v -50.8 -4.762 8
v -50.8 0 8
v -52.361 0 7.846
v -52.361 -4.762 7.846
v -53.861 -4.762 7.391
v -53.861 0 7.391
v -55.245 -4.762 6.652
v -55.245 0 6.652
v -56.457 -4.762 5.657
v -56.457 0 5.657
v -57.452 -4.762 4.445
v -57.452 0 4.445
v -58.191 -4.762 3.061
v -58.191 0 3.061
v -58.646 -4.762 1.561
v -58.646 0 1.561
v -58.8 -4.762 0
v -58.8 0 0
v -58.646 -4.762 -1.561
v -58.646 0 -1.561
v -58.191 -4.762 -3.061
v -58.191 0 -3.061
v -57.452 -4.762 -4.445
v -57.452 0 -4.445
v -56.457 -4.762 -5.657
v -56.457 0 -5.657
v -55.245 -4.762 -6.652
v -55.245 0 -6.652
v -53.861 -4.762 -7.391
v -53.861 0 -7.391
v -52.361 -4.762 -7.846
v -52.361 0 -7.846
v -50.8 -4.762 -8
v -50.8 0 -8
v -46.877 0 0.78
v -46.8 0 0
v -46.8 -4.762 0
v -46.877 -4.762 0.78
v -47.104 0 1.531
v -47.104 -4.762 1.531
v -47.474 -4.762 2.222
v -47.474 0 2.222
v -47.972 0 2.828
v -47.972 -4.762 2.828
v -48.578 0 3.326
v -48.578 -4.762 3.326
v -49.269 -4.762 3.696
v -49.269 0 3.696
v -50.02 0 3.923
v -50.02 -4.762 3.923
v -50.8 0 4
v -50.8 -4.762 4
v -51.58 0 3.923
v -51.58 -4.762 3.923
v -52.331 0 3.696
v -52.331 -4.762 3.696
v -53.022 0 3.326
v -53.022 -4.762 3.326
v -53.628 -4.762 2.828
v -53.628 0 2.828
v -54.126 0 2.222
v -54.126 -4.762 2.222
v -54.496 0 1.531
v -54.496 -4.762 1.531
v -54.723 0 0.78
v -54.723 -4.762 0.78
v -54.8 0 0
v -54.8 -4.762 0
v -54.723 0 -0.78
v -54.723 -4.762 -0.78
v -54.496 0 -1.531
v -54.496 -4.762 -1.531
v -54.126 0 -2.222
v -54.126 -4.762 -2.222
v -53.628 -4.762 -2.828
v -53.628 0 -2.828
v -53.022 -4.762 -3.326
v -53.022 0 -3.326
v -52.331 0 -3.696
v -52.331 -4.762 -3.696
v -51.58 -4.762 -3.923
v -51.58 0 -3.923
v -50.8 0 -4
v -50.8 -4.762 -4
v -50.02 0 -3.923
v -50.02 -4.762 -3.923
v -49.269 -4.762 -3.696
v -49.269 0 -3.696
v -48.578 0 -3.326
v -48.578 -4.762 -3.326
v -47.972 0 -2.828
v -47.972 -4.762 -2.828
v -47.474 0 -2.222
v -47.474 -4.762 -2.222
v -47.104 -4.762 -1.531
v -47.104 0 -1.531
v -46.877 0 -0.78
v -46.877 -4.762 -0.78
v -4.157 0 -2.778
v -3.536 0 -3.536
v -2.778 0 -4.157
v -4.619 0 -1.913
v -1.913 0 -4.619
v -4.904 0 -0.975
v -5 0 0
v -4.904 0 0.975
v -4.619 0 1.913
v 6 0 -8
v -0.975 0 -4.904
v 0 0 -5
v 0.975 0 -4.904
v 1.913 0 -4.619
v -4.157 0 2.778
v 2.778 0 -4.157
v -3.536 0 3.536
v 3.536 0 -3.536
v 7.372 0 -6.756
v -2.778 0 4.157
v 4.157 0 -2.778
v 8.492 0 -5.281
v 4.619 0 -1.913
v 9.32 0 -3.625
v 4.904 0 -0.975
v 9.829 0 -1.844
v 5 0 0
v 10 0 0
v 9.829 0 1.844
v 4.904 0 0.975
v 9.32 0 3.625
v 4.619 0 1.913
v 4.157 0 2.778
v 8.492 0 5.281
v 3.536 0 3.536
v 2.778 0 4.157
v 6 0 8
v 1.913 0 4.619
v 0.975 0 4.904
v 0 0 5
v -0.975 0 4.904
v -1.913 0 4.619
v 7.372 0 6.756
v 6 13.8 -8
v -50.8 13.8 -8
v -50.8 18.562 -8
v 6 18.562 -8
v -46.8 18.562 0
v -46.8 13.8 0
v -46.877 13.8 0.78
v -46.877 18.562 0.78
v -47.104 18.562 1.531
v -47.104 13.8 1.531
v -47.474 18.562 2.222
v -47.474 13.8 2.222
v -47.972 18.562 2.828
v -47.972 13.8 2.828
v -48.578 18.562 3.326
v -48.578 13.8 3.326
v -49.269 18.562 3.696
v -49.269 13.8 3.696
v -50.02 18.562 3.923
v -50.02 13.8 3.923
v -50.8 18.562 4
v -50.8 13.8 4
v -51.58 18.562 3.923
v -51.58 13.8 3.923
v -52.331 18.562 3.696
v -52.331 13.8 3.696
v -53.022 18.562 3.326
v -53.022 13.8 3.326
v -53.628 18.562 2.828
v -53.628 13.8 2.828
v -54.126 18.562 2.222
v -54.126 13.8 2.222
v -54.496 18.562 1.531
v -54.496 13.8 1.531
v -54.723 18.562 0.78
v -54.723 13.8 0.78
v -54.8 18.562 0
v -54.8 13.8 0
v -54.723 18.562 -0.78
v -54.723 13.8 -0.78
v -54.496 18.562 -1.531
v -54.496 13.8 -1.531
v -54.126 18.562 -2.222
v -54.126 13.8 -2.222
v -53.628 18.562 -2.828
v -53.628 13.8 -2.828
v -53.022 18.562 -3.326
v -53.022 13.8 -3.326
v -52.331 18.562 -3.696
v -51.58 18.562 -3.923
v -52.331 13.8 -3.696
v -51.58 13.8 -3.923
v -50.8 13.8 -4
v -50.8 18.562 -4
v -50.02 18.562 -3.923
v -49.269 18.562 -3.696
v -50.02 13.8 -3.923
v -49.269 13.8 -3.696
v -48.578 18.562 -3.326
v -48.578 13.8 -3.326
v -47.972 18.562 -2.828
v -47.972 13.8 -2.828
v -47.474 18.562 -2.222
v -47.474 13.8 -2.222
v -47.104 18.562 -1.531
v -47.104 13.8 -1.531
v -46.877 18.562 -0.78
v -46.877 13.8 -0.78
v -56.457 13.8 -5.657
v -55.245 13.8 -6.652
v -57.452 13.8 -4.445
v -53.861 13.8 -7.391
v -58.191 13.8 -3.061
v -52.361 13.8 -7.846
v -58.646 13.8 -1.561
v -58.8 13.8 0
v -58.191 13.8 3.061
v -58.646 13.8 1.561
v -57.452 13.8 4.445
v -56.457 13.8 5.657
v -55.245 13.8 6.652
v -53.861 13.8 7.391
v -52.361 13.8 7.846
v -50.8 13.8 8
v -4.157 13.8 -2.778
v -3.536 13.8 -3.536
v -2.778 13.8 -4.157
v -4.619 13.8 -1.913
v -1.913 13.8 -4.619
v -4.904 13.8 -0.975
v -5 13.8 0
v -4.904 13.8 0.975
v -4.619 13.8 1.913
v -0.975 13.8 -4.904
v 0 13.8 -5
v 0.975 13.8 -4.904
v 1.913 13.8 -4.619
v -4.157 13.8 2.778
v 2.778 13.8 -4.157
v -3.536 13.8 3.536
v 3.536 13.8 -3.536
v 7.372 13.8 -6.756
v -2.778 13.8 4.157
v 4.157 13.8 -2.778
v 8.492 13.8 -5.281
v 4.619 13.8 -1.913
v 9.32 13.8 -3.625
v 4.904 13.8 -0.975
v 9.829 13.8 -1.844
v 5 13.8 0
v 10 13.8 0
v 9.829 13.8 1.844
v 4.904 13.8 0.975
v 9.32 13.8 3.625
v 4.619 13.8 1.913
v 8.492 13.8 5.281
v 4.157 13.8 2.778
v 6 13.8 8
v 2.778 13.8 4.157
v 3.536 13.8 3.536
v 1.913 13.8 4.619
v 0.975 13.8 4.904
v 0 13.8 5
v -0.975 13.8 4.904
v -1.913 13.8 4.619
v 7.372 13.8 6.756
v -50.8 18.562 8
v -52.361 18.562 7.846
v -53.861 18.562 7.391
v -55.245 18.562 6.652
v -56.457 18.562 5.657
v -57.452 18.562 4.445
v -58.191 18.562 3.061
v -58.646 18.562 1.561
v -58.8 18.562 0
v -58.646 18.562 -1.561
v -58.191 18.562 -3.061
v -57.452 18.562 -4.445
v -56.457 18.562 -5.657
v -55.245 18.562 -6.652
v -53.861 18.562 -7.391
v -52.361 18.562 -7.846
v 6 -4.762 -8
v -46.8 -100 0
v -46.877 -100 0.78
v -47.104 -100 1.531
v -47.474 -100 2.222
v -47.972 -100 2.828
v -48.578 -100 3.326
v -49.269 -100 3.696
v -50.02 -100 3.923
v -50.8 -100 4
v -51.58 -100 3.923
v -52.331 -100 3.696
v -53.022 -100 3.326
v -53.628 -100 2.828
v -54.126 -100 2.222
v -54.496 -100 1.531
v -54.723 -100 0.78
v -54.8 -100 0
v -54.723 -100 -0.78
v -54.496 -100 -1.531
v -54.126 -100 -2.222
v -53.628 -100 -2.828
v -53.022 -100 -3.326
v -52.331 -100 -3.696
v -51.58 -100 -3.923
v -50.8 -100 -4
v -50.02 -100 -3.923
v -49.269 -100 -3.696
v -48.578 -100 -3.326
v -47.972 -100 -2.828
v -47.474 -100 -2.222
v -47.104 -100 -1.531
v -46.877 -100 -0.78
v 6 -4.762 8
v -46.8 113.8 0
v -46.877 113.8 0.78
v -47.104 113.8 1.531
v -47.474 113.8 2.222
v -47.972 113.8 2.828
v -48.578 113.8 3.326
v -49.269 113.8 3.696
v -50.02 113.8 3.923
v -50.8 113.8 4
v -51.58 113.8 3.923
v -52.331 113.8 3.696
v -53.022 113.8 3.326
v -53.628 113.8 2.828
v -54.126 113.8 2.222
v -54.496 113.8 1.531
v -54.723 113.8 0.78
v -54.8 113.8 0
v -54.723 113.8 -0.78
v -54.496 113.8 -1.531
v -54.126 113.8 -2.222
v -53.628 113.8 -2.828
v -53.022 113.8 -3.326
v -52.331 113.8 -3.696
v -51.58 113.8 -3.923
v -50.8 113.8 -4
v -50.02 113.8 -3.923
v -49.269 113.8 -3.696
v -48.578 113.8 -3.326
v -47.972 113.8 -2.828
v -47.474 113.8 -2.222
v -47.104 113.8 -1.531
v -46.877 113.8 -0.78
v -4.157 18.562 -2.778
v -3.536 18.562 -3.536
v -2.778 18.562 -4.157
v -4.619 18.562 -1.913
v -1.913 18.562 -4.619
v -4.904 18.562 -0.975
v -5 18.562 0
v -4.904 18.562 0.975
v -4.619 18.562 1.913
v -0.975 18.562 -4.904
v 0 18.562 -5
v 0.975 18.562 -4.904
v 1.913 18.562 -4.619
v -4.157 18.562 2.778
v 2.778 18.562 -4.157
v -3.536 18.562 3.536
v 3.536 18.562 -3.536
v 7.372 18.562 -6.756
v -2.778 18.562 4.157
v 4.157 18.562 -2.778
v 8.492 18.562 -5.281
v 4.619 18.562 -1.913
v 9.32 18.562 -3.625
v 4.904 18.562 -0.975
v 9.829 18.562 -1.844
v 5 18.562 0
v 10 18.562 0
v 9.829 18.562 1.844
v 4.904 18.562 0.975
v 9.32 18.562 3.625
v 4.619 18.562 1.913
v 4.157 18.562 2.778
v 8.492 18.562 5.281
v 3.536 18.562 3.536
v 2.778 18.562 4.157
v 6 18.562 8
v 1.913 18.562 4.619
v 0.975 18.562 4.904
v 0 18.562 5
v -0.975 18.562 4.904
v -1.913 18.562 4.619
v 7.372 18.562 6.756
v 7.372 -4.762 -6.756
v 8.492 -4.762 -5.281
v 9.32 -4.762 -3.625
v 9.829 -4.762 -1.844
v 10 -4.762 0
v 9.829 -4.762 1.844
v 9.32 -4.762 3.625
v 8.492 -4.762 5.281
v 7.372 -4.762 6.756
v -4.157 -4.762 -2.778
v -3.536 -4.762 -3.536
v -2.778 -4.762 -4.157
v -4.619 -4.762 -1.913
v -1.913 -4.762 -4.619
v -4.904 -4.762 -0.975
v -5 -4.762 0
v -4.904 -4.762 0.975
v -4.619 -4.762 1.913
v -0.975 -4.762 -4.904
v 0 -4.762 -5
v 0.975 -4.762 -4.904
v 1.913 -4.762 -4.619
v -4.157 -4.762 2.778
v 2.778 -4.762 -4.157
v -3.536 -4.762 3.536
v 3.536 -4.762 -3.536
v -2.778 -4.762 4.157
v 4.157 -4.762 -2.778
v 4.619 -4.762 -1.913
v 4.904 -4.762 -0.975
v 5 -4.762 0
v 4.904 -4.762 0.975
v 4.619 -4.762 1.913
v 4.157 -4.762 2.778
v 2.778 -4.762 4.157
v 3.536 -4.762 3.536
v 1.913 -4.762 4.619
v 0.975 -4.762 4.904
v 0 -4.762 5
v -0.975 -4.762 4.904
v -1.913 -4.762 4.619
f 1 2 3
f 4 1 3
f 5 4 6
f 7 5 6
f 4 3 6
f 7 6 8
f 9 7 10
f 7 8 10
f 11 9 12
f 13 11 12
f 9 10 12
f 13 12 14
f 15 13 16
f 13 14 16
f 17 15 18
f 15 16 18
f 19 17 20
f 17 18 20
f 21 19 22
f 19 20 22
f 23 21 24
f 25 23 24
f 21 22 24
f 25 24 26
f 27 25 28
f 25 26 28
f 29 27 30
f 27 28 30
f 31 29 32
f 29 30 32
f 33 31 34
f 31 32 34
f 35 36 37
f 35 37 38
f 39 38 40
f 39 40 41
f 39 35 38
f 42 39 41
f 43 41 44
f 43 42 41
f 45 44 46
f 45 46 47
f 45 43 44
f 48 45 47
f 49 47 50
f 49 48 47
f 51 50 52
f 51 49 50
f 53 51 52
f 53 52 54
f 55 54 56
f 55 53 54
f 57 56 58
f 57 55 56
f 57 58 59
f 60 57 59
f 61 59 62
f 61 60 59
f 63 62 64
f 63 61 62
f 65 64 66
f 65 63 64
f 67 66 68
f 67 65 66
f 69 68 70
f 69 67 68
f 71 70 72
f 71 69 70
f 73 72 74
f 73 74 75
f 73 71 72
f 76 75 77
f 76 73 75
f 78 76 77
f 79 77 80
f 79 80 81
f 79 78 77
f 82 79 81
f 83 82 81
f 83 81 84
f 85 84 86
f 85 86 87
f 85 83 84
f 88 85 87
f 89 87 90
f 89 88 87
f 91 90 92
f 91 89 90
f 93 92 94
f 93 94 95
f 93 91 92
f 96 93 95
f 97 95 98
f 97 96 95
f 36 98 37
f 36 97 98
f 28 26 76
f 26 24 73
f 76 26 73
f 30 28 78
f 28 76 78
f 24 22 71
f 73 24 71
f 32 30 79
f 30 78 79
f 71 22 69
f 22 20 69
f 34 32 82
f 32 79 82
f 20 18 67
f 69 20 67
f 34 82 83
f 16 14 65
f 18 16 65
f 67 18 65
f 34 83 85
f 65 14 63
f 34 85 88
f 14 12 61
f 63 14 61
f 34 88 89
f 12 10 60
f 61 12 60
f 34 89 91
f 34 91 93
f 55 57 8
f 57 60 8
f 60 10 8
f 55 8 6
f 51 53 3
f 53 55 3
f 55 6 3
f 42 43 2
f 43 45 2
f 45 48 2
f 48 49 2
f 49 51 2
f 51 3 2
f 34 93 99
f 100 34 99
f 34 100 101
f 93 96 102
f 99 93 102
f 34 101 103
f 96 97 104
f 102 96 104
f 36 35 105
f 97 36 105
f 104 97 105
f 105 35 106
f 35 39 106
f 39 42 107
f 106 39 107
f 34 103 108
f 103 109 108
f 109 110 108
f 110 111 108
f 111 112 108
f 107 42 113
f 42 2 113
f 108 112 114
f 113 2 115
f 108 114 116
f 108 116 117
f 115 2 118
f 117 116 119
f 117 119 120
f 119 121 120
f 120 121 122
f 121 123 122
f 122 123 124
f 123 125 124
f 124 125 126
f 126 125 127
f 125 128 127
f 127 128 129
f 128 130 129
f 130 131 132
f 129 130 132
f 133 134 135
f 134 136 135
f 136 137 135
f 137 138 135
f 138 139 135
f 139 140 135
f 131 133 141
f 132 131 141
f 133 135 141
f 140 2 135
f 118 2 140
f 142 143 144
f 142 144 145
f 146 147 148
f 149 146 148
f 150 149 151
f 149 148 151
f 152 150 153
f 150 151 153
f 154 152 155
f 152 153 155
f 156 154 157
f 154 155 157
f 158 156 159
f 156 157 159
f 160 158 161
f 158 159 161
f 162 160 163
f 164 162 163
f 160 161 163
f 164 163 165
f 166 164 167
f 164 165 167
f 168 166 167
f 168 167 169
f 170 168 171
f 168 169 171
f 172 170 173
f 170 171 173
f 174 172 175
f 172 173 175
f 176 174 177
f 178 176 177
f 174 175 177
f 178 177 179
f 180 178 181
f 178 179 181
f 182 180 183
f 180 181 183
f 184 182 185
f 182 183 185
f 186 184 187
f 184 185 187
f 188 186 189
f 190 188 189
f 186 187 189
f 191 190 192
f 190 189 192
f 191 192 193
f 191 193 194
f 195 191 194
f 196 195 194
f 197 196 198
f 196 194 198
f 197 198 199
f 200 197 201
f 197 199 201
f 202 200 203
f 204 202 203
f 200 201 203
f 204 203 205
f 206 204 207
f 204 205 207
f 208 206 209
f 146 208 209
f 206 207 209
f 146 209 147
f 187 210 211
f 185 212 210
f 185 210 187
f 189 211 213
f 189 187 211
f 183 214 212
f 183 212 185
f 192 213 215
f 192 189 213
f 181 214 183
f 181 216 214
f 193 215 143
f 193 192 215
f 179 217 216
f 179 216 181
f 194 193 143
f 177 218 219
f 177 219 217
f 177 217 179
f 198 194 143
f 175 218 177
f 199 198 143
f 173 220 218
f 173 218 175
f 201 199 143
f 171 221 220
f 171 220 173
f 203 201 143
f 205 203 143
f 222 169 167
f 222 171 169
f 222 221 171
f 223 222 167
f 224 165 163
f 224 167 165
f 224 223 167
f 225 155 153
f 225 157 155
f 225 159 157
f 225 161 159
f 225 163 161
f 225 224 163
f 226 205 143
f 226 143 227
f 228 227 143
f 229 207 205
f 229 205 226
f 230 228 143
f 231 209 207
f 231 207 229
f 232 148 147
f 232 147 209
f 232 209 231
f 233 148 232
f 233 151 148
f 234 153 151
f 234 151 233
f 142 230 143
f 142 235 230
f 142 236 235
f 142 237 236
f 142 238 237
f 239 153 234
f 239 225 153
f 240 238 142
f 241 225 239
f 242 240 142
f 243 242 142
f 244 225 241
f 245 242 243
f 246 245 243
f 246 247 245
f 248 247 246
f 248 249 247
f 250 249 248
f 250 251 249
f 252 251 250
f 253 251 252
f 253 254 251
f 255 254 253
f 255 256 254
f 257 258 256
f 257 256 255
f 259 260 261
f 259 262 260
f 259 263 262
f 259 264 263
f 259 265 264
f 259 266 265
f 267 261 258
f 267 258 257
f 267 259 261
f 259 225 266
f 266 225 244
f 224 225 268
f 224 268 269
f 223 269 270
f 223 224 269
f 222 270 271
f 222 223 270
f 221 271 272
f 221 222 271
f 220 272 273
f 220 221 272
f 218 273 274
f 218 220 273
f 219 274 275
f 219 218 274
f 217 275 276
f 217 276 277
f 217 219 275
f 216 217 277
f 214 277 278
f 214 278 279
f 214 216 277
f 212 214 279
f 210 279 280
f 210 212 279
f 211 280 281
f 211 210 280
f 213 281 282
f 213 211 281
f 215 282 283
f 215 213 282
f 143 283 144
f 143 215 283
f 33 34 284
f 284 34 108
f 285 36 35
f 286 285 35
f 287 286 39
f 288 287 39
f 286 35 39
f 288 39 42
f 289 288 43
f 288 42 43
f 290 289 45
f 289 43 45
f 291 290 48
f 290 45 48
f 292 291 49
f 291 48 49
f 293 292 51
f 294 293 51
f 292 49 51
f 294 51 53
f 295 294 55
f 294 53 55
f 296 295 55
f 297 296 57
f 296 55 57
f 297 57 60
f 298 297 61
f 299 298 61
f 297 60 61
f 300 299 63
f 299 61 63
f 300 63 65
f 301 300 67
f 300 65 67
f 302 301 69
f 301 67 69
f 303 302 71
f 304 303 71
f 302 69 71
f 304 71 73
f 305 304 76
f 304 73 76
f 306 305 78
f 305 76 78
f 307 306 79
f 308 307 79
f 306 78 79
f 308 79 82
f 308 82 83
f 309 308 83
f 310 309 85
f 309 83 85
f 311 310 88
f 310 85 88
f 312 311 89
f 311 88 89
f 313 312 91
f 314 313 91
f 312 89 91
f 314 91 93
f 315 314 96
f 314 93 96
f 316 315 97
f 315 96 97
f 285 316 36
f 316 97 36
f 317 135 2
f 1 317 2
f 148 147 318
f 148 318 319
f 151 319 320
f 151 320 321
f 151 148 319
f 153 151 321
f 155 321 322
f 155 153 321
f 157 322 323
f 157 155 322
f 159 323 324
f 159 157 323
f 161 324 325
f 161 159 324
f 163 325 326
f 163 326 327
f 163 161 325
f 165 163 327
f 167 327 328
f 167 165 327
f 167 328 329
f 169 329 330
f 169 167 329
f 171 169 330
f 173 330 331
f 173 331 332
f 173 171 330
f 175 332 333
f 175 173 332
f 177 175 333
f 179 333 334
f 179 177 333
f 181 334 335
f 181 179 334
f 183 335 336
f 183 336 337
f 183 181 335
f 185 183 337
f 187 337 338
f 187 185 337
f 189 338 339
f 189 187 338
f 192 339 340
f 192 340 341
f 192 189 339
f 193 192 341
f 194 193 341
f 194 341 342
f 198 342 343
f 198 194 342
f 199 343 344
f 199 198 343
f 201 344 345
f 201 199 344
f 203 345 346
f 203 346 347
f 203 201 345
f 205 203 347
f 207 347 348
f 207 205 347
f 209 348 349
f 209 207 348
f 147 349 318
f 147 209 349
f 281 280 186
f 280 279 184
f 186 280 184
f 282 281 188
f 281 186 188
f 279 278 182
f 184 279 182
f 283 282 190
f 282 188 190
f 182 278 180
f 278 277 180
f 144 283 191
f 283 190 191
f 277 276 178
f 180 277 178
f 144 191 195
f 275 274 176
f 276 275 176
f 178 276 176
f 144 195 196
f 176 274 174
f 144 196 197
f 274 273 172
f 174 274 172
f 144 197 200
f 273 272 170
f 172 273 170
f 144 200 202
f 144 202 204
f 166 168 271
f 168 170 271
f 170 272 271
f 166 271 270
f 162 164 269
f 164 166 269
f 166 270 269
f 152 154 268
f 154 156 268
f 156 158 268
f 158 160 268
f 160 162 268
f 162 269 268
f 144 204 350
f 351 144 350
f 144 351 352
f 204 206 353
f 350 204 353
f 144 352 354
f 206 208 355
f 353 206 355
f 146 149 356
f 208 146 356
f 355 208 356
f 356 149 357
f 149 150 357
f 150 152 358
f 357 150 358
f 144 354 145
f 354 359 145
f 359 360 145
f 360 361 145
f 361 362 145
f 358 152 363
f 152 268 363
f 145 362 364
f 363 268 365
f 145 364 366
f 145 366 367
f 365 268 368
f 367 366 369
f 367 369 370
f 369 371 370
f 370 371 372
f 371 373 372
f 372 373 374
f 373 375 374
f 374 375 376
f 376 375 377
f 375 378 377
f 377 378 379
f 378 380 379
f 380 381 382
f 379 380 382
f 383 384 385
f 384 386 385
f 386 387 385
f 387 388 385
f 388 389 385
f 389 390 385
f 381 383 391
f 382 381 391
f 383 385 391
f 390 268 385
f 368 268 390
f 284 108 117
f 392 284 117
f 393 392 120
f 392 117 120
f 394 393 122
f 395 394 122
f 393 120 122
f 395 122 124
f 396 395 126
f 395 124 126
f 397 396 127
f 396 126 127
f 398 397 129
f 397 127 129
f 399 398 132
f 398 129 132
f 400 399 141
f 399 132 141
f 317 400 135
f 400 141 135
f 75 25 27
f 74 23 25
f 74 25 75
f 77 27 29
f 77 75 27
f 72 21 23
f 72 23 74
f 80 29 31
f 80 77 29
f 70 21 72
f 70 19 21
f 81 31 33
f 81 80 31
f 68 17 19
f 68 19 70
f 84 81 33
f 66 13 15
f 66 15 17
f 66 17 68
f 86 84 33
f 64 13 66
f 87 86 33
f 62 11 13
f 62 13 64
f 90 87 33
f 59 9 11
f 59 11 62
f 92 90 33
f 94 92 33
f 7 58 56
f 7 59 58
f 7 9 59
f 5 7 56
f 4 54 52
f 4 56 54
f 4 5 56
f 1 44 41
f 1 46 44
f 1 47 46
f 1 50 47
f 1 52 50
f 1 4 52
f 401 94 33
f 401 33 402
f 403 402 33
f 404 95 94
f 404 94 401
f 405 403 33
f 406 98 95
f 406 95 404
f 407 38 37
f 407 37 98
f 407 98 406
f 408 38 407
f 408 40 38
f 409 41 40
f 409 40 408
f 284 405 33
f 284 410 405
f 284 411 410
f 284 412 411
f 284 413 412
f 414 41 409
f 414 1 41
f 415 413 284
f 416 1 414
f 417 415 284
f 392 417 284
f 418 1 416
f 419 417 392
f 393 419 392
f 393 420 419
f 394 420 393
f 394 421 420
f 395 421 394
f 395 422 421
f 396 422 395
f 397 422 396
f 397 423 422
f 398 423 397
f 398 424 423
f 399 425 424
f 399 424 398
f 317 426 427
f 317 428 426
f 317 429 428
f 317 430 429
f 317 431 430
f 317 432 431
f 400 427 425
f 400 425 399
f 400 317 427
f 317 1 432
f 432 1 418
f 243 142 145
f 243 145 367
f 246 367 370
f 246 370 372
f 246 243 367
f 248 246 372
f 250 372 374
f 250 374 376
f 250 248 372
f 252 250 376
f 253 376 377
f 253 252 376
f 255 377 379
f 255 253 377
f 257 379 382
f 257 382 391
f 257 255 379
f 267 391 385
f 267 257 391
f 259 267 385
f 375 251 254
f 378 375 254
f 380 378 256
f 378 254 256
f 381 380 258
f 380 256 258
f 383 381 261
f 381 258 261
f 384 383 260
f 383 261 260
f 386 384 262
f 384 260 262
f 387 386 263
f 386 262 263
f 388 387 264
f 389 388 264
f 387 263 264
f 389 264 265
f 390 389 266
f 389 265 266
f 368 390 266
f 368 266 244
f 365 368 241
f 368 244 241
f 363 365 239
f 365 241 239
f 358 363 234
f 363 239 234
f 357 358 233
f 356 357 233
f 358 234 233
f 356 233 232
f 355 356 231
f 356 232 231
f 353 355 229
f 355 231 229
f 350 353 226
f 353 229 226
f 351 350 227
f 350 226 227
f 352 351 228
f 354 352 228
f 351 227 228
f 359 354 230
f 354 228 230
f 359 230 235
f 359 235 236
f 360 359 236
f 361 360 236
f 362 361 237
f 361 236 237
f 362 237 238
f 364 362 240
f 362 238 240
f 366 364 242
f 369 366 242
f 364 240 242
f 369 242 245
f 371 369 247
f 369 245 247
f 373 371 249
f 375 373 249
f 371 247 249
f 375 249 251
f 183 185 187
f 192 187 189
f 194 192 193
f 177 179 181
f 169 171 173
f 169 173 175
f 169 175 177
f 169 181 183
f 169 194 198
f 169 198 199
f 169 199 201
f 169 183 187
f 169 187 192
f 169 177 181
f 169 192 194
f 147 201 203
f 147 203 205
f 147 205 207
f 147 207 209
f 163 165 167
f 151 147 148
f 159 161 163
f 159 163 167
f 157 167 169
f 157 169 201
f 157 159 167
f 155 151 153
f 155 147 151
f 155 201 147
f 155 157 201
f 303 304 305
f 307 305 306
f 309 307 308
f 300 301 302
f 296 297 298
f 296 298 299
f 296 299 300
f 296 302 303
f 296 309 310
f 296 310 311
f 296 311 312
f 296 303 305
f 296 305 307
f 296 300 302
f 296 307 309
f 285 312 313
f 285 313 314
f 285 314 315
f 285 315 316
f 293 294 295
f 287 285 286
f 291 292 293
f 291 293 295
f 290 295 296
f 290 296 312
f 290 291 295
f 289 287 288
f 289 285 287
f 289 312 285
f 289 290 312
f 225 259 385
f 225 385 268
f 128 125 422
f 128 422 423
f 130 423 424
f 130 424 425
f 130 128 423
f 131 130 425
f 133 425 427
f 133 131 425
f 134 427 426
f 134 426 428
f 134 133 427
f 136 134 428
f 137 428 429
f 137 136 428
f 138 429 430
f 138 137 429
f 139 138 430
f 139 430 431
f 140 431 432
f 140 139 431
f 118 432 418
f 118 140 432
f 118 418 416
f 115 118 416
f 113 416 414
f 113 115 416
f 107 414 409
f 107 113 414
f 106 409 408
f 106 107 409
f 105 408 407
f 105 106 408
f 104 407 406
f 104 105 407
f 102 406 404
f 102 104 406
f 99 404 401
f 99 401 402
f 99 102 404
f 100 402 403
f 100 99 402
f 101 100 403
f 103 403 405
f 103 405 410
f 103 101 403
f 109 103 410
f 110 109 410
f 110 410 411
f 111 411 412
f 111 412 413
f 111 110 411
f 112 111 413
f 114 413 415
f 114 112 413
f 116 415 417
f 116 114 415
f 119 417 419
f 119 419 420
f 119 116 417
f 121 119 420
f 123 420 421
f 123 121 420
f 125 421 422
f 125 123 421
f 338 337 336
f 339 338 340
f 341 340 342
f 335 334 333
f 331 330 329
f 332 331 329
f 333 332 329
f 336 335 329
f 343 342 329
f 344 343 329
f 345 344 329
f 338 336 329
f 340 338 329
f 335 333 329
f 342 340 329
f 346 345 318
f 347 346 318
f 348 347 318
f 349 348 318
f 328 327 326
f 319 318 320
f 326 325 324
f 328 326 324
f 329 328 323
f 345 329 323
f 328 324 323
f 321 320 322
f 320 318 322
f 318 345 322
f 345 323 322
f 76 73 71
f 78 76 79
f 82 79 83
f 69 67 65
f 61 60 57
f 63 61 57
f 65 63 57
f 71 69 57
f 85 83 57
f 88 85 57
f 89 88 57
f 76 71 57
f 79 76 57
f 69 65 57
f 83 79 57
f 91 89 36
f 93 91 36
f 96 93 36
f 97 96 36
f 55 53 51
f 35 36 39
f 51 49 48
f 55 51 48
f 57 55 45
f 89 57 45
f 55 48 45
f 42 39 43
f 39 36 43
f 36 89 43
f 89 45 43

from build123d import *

# Parameters (mm, degrees)
F0_R     = 4
F0_R_2   = 5
F1_DEPTH = 4.7625
F2_R     = 4
F3_DEPTH = 100


with BuildPart() as f1:
    # F0 (on Front) → F1 (new body)
    with BuildSketch(Plane.XZ):
        with BuildLine():
            Line((6, 8), (-50.8, 8))
            ThreePointArc((-50.8, 8), (-58.8, 0), (-50.8, -8))
            Line((-50.8, -8), (6, -8))
            ThreePointArc((6, -8), (10, 0), (6, 8))
        make_face()
        with Locations((-50.8, 0)):
            Circle(F0_R, mode=Mode.SUBTRACT)
        Circle(F0_R_2, mode=Mode.SUBTRACT)
    extrude(amount=F1_DEPTH)


with BuildPart() as f3:
    # F2 (on Front) → F3 (new body)
    with BuildSketch(Plane.XZ):
        with Locations((-50.8, 0)):
            Circle(F2_R)
    extrude(amount=F3_DEPTH)


with BuildPart() as f5_1:
    # F5: instance of F1
    add(f1.part.mirror(Plane.XZ.offset(-6.9)))


with BuildPart() as f5_2:
    # F5: instance of F3
    add(f3.part.mirror(Plane.XZ.offset(-6.9)))


solid = Compound([f1.part, f3.part, f5_1.part, f5_2.part])
